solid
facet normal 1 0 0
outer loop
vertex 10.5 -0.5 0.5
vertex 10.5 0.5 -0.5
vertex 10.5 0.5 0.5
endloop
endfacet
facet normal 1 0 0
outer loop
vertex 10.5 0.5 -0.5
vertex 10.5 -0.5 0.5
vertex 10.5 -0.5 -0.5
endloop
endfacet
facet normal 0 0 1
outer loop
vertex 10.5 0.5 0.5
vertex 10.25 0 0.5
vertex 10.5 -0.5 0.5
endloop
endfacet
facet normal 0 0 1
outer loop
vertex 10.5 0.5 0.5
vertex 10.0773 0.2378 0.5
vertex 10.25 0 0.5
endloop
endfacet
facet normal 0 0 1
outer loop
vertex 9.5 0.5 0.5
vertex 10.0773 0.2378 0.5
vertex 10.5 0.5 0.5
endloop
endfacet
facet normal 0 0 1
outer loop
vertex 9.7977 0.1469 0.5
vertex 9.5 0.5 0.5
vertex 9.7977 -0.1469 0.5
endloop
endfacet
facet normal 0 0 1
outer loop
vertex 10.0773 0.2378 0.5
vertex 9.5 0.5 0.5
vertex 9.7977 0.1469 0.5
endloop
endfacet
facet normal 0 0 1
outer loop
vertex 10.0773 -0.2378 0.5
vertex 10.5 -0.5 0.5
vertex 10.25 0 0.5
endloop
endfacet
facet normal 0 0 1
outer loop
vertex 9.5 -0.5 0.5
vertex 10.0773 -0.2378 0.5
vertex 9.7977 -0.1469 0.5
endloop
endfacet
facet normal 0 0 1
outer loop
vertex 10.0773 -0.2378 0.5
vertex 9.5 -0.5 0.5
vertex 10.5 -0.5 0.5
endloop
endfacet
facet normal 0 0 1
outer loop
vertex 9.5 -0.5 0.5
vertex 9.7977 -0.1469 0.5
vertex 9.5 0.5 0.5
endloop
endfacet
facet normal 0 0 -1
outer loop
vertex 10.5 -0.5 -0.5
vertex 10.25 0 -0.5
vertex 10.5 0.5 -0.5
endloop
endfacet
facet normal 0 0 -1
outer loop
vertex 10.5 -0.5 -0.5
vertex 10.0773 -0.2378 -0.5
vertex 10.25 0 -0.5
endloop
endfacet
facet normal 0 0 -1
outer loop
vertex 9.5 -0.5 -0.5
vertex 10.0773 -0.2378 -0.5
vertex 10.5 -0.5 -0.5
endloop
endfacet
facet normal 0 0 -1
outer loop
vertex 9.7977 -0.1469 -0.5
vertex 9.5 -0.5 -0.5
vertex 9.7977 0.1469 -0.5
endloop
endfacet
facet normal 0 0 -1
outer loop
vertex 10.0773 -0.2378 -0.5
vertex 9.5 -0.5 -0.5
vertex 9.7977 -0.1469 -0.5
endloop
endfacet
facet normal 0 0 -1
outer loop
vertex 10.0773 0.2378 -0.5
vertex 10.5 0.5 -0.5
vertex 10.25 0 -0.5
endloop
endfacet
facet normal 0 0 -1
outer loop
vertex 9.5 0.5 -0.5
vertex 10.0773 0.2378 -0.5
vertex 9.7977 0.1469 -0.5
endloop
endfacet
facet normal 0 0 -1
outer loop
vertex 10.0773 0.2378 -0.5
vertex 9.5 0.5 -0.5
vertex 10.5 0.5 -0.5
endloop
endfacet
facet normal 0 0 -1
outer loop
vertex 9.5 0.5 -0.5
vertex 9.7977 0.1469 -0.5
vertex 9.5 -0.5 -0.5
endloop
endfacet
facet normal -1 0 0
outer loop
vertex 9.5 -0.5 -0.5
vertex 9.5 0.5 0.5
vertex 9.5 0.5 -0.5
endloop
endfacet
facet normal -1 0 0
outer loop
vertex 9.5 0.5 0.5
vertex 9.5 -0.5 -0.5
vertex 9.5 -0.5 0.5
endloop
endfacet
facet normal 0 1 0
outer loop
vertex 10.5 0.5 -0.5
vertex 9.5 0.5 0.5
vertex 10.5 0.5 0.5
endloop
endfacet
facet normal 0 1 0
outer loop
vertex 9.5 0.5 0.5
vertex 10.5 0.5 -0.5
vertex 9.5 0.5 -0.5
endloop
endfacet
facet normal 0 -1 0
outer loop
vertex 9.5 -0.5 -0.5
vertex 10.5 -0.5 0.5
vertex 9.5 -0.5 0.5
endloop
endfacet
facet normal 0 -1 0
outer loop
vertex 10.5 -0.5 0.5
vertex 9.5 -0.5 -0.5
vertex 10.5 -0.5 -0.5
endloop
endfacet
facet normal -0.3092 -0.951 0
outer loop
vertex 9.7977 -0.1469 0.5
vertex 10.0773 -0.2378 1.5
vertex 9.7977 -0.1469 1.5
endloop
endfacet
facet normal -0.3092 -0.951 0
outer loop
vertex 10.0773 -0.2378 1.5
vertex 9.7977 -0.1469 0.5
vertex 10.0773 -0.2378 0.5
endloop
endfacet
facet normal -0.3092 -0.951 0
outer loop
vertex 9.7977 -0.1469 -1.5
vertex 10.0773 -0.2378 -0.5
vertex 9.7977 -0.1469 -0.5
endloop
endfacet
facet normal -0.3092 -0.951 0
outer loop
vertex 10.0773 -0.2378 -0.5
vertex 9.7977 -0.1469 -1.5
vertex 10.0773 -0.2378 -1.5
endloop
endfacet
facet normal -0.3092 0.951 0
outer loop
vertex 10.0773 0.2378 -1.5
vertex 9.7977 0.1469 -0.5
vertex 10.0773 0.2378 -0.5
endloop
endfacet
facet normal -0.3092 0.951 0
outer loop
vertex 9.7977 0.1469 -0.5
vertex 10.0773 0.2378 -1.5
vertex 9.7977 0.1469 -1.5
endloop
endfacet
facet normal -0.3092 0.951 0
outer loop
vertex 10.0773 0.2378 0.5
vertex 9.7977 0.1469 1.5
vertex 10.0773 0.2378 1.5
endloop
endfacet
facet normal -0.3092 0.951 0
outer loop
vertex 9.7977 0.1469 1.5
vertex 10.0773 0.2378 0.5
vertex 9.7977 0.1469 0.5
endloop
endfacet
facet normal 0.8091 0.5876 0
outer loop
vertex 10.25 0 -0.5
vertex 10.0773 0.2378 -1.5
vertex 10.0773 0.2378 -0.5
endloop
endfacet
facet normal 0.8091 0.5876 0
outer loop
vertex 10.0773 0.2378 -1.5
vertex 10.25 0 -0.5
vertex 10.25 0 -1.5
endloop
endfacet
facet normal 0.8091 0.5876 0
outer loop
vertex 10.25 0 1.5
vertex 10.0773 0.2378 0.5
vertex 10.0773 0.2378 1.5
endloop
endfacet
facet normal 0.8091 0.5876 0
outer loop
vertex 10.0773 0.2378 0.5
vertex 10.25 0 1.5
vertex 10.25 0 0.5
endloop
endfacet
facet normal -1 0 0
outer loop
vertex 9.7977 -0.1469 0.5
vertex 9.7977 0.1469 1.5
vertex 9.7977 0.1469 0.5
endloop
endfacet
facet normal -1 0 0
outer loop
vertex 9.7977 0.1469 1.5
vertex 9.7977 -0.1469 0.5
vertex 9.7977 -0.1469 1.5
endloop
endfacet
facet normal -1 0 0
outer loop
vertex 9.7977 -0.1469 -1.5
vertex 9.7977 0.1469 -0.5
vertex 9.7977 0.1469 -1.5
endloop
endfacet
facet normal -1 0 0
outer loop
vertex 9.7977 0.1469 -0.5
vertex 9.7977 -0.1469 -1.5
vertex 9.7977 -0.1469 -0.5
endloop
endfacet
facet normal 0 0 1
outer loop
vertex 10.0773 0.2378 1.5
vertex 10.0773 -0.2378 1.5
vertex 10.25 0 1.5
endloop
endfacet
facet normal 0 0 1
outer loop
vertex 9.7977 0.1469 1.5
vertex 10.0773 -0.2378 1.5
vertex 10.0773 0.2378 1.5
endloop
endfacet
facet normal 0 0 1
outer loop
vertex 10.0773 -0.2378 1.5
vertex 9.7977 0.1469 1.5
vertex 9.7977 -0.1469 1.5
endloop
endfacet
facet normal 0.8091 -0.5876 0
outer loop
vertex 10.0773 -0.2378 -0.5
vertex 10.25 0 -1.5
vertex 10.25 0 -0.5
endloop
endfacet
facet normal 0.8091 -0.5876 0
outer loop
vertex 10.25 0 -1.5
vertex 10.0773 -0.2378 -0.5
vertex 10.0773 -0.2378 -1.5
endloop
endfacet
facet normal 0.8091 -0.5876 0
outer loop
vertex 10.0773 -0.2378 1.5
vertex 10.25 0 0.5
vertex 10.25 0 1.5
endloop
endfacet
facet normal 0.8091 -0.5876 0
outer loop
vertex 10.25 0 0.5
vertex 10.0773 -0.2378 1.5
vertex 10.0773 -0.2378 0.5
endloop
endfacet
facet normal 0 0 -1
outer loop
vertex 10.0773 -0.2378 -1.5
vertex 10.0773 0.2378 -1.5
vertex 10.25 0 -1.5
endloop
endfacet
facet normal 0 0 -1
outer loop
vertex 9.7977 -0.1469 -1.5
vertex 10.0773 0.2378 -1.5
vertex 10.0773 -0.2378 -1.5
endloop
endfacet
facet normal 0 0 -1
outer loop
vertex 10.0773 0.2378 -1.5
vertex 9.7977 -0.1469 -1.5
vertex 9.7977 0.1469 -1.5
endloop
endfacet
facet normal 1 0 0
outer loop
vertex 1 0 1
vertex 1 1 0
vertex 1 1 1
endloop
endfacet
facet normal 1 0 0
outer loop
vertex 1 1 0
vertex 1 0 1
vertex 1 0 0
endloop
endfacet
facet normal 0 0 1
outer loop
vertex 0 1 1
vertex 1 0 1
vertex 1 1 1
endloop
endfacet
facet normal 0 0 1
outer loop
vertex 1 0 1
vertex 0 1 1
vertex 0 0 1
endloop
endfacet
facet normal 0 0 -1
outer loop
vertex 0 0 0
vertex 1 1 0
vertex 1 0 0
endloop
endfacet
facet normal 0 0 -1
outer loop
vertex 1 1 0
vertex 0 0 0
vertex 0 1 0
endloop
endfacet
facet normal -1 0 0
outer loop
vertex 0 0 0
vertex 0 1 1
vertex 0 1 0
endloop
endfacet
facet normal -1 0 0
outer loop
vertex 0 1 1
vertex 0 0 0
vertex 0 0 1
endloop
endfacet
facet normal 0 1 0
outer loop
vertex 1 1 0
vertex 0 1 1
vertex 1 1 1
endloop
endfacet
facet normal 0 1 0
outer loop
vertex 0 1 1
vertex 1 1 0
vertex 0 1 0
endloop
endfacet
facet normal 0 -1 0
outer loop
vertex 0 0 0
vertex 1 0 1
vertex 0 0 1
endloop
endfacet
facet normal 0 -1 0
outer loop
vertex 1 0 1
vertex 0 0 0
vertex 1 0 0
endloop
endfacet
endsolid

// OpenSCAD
  
a = 5;
b = 6;
  if (a==5) {
    if (b==6)
        cube([1,1,1]);
    else {
        translate([3,0,0])
        cylinder(1,1);
    }
  }
  
translate([10,0,0])
    union() {
        cube([1,1,1], center=true);
        if (b==1) cylinder(h=3,r=0.25, center=true);
        else cylinder(h=3,r=0.25, center=true);
        
        }
        
